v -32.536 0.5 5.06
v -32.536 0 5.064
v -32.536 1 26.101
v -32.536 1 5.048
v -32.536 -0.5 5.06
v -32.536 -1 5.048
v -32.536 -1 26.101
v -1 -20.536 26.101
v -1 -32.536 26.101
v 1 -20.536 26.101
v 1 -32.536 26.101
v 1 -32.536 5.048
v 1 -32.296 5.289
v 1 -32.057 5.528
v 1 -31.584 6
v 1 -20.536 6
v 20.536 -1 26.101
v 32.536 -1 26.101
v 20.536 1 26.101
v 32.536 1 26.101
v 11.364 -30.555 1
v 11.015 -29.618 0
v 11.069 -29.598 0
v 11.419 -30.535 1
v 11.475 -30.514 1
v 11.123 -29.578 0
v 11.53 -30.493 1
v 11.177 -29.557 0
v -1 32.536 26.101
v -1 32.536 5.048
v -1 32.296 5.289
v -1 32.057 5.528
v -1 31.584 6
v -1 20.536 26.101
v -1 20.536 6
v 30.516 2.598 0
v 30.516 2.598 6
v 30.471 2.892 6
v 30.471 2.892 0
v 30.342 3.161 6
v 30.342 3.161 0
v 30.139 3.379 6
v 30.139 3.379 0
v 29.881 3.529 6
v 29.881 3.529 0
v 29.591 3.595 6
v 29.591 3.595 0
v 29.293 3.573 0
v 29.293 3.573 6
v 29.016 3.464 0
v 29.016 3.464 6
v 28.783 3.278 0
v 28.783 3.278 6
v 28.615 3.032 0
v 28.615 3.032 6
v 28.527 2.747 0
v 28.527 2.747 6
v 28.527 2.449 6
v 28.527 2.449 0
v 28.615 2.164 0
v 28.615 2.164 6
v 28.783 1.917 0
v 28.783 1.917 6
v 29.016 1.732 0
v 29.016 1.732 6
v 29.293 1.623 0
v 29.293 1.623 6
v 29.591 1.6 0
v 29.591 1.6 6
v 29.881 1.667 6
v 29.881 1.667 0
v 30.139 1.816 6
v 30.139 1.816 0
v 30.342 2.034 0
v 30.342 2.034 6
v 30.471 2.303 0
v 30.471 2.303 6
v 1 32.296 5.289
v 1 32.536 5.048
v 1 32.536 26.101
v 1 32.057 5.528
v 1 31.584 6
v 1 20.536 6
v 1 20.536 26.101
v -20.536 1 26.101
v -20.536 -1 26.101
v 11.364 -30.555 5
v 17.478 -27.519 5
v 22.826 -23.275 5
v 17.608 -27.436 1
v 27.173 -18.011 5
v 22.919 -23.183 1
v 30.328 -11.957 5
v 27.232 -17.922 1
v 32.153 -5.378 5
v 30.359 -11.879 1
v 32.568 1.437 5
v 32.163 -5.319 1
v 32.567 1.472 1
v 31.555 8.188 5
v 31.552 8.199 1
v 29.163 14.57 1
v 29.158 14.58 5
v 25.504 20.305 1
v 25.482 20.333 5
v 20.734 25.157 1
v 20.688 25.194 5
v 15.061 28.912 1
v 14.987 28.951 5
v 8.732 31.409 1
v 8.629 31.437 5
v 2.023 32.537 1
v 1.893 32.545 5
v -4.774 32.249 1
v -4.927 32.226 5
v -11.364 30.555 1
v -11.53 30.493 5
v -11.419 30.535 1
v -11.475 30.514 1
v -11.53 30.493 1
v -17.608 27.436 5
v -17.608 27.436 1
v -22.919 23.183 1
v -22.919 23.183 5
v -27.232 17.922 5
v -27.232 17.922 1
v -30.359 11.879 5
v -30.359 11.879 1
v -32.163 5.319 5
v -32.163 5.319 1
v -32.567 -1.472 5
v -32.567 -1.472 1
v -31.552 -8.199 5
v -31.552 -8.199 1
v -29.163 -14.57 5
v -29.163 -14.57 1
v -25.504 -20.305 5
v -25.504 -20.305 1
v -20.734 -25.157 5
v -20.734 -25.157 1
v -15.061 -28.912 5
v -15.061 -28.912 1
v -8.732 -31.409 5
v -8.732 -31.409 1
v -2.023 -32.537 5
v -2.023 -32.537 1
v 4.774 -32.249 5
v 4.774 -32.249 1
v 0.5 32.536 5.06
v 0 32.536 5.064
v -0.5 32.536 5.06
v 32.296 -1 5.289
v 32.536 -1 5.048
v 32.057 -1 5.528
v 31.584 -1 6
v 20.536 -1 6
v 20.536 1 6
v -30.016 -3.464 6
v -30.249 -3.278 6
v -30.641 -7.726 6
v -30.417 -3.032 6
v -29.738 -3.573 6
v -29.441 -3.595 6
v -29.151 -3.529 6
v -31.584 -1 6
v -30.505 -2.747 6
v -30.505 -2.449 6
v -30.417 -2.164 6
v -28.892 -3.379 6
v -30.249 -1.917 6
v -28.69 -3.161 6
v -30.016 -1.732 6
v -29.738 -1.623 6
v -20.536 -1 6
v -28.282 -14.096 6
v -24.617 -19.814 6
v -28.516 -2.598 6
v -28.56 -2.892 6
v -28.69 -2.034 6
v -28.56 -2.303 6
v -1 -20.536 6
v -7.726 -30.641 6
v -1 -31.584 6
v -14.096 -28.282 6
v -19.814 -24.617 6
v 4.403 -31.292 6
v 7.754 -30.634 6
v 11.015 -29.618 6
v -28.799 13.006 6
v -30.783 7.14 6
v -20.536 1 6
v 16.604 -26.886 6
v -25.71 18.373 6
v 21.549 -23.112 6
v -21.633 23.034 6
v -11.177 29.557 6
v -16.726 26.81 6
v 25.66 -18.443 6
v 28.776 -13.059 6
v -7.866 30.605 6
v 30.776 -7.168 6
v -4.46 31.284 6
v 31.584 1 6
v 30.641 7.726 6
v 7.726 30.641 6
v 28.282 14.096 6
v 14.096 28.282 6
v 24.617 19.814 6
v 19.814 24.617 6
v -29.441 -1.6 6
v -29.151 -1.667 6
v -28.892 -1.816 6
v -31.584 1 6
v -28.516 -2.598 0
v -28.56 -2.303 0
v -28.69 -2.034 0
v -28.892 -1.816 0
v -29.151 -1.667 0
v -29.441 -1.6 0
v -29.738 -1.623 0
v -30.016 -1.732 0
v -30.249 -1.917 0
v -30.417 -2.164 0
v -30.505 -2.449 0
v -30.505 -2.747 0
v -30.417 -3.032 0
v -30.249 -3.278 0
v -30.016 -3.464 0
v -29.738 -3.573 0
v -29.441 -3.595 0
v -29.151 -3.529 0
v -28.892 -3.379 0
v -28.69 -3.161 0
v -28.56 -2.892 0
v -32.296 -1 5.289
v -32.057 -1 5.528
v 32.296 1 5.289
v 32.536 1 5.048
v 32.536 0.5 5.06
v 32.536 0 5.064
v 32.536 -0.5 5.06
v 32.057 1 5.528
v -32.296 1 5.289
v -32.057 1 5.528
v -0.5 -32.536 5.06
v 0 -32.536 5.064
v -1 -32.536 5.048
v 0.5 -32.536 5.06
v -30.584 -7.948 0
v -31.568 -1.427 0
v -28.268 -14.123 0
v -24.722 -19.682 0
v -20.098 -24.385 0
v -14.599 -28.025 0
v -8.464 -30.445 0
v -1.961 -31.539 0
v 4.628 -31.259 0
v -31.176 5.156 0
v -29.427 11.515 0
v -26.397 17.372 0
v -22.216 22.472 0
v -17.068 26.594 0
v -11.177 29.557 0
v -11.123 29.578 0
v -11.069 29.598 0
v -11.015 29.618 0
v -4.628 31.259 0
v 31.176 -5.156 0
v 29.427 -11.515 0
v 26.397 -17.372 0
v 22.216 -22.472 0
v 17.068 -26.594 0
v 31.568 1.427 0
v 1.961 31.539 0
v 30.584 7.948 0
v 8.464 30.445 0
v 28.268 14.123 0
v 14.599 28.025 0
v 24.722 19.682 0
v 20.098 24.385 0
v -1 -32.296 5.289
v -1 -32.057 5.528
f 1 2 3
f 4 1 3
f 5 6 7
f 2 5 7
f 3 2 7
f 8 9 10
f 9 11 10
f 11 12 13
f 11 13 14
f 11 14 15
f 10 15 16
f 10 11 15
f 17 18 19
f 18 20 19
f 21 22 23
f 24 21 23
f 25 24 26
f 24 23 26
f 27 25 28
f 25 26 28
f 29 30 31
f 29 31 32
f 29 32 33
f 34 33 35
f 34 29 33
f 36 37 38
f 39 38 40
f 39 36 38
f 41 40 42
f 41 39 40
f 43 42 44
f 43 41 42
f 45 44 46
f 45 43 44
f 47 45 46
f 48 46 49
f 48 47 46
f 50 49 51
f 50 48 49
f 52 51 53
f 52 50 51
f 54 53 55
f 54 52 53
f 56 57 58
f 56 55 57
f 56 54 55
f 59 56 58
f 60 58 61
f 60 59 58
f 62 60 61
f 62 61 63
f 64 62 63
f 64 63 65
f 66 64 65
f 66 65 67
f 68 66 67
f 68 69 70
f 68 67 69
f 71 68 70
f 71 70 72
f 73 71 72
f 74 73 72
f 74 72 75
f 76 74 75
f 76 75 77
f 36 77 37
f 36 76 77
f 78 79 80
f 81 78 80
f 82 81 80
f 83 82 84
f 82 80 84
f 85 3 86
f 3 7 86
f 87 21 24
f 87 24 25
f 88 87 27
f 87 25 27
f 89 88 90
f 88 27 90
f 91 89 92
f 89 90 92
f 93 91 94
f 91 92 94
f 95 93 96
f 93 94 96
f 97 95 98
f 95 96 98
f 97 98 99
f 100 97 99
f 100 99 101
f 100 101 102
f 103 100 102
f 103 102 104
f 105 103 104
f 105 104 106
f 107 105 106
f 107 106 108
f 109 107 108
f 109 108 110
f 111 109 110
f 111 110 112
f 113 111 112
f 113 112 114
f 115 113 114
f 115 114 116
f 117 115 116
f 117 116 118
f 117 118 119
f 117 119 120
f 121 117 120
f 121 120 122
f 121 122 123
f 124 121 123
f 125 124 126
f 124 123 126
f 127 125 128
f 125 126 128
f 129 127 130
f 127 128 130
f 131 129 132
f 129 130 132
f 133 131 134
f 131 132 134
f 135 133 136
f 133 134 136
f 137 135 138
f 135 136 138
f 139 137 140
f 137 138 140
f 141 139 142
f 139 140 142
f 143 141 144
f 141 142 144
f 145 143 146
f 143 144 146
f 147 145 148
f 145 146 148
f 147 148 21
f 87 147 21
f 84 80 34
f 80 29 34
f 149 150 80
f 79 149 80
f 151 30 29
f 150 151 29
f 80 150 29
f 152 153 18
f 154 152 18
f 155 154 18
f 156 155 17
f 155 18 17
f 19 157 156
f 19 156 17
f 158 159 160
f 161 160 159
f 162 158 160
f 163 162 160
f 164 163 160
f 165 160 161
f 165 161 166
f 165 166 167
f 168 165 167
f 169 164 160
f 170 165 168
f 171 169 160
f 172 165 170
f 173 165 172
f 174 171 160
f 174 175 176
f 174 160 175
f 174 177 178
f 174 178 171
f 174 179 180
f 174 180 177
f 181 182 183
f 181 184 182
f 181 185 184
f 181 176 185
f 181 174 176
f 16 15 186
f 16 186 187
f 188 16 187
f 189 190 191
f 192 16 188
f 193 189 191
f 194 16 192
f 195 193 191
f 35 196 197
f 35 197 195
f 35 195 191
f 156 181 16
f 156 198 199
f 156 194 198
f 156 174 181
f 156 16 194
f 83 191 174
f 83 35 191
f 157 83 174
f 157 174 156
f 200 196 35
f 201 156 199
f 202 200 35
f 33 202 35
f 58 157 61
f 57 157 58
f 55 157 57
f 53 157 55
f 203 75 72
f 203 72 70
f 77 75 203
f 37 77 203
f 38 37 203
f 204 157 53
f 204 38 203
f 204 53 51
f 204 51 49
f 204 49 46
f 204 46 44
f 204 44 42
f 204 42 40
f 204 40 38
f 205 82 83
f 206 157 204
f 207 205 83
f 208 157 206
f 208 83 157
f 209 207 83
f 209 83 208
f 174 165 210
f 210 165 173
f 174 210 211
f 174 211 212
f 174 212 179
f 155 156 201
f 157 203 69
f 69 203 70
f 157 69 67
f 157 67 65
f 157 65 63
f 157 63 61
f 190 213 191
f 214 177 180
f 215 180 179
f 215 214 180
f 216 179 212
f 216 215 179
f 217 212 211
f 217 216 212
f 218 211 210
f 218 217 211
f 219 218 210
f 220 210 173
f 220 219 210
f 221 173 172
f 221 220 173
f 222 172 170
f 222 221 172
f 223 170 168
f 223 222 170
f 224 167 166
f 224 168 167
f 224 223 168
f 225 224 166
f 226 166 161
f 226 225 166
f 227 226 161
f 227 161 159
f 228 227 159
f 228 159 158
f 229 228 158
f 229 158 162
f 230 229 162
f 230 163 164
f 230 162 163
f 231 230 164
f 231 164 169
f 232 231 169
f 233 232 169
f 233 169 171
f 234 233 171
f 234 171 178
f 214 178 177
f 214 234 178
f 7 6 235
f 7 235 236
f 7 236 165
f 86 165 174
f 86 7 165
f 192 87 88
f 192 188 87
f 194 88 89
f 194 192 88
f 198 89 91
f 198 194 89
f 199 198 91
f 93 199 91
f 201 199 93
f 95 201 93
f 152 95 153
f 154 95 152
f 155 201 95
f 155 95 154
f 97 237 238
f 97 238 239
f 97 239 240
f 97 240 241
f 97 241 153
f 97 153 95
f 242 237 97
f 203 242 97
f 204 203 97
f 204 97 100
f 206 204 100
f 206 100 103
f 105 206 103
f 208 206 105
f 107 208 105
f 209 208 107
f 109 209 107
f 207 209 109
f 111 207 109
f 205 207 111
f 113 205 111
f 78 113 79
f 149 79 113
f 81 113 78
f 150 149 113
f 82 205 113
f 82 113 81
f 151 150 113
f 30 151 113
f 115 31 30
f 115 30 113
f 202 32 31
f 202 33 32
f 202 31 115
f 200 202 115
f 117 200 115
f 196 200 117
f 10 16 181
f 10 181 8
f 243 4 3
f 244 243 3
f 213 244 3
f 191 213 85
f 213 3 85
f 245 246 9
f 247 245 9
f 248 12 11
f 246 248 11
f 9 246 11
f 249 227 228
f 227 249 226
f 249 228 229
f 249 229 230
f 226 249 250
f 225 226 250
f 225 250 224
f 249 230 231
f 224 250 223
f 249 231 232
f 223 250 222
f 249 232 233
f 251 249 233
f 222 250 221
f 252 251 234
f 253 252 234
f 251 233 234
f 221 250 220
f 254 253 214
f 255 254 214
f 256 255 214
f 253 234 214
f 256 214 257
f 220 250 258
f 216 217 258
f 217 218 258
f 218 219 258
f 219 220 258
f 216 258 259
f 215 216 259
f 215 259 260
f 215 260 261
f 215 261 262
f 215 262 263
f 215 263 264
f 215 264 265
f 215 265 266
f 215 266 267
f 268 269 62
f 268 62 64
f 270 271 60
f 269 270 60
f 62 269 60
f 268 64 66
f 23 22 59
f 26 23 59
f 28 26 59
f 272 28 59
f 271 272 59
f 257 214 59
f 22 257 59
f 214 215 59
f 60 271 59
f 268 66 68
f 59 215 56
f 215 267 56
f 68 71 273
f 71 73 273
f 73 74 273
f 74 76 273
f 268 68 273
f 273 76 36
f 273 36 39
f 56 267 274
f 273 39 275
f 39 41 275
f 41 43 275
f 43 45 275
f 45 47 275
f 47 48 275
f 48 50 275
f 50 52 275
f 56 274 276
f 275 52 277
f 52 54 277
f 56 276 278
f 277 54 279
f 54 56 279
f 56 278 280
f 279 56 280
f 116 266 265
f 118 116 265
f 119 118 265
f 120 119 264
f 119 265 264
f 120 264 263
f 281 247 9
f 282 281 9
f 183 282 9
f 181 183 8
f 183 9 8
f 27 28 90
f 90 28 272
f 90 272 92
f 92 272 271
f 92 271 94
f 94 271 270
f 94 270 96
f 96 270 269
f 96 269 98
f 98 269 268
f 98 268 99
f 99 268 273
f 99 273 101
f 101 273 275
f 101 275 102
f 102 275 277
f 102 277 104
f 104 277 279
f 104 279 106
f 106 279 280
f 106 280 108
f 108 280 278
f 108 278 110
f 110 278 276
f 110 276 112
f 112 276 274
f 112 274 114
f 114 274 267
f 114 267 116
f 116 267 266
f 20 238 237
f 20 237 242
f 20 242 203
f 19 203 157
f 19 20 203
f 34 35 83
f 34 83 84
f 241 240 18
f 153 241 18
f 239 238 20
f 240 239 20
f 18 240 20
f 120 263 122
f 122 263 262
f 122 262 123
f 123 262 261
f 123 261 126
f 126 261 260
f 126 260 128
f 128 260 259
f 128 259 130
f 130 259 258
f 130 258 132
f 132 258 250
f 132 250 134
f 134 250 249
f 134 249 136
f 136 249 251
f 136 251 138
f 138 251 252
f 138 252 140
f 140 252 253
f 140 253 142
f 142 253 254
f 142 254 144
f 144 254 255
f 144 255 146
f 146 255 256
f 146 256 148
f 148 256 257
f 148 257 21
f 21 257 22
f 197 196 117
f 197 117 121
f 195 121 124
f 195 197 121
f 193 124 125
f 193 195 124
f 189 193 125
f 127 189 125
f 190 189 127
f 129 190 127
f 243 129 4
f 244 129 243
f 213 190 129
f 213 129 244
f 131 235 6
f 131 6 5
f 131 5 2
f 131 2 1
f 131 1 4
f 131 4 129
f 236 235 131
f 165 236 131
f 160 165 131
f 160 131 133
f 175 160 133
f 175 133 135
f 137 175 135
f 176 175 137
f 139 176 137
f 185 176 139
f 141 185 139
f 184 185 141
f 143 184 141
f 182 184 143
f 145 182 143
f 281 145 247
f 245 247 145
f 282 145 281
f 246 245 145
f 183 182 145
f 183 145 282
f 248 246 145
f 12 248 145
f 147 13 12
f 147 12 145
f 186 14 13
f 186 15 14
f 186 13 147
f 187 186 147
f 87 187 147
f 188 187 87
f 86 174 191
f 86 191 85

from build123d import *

# Parameters (mm, degrees)
F1_DEPTH = 6
F2_SIZE  = 1
F3_W     = 12
F3_H     = 23
F4_DEPTH = 1
F5_COUNT = 4
F6_R     = 1
F7_DEPTH = 25


with BuildPart() as f1:
    # F0 (on Top) → F1 (new body)
    with BuildSketch(Plane.XY):
        with BuildLine():
            Line((11.3636297451, -30.5553255426), (-11.5303793462, 30.4927918061))
            ThreePointArc((-11.5303793462, 30.4927918061), (-30.524172541, -11.4470472475), (11.3636297451, -30.5553255426))
        make_face()
        with BuildLine():
            ThreePointArc((11.3636297451, -30.5553255426), (26.7695193241, -18.6051830186), (32.6, 0))
            ThreePointArc((32.6, 0), (18.5319944058, 26.8202383163), (-11.5303793462, 30.4927918061))
            Line((-11.5303793462, 30.4927918061), (11.3636297451, -30.5553255426))
        make_face()
    extrude(amount=F1_DEPTH)

    # F2
    f2_edges = [f1.edges().sort_by_distance(p)[0] for p in [
        (-11.36363, 30.555326, 6),
        (-11.36363, 30.555326, 0),
    ]]
    chamfer(f2_edges, length=F2_SIZE)

    # F3 (on Front) → F4 (join, symmetric)
    with BuildSketch(Plane.XZ):
        with Locations((-26.536149025, 14.6011034735)):
            Rectangle(F3_W, F3_H)
    extrude(amount=F4_DEPTH, both=True)

    # F5: F1 ×4 about axis
    f5_axis = Axis((0, 0, 5), (0, 0, -1))


with BuildPart() as f1_1:
    add(f1.part)
    for i in range(1, F5_COUNT):
        add(f1.part.rotate(f5_axis, i * 360 / F5_COUNT))

    # F6 (on Top) → F7 (cut)
    with BuildSketch(Plane.XY):
        with Locations((-29.5159034431, -2.5976577308)):
            Circle(F6_R)
        with Locations((29.5159034431, 2.5976577308)):
            Circle(F6_R)
    extrude(amount=F7_DEPTH, mode=Mode.SUBTRACT)


solid = f1_1.part
